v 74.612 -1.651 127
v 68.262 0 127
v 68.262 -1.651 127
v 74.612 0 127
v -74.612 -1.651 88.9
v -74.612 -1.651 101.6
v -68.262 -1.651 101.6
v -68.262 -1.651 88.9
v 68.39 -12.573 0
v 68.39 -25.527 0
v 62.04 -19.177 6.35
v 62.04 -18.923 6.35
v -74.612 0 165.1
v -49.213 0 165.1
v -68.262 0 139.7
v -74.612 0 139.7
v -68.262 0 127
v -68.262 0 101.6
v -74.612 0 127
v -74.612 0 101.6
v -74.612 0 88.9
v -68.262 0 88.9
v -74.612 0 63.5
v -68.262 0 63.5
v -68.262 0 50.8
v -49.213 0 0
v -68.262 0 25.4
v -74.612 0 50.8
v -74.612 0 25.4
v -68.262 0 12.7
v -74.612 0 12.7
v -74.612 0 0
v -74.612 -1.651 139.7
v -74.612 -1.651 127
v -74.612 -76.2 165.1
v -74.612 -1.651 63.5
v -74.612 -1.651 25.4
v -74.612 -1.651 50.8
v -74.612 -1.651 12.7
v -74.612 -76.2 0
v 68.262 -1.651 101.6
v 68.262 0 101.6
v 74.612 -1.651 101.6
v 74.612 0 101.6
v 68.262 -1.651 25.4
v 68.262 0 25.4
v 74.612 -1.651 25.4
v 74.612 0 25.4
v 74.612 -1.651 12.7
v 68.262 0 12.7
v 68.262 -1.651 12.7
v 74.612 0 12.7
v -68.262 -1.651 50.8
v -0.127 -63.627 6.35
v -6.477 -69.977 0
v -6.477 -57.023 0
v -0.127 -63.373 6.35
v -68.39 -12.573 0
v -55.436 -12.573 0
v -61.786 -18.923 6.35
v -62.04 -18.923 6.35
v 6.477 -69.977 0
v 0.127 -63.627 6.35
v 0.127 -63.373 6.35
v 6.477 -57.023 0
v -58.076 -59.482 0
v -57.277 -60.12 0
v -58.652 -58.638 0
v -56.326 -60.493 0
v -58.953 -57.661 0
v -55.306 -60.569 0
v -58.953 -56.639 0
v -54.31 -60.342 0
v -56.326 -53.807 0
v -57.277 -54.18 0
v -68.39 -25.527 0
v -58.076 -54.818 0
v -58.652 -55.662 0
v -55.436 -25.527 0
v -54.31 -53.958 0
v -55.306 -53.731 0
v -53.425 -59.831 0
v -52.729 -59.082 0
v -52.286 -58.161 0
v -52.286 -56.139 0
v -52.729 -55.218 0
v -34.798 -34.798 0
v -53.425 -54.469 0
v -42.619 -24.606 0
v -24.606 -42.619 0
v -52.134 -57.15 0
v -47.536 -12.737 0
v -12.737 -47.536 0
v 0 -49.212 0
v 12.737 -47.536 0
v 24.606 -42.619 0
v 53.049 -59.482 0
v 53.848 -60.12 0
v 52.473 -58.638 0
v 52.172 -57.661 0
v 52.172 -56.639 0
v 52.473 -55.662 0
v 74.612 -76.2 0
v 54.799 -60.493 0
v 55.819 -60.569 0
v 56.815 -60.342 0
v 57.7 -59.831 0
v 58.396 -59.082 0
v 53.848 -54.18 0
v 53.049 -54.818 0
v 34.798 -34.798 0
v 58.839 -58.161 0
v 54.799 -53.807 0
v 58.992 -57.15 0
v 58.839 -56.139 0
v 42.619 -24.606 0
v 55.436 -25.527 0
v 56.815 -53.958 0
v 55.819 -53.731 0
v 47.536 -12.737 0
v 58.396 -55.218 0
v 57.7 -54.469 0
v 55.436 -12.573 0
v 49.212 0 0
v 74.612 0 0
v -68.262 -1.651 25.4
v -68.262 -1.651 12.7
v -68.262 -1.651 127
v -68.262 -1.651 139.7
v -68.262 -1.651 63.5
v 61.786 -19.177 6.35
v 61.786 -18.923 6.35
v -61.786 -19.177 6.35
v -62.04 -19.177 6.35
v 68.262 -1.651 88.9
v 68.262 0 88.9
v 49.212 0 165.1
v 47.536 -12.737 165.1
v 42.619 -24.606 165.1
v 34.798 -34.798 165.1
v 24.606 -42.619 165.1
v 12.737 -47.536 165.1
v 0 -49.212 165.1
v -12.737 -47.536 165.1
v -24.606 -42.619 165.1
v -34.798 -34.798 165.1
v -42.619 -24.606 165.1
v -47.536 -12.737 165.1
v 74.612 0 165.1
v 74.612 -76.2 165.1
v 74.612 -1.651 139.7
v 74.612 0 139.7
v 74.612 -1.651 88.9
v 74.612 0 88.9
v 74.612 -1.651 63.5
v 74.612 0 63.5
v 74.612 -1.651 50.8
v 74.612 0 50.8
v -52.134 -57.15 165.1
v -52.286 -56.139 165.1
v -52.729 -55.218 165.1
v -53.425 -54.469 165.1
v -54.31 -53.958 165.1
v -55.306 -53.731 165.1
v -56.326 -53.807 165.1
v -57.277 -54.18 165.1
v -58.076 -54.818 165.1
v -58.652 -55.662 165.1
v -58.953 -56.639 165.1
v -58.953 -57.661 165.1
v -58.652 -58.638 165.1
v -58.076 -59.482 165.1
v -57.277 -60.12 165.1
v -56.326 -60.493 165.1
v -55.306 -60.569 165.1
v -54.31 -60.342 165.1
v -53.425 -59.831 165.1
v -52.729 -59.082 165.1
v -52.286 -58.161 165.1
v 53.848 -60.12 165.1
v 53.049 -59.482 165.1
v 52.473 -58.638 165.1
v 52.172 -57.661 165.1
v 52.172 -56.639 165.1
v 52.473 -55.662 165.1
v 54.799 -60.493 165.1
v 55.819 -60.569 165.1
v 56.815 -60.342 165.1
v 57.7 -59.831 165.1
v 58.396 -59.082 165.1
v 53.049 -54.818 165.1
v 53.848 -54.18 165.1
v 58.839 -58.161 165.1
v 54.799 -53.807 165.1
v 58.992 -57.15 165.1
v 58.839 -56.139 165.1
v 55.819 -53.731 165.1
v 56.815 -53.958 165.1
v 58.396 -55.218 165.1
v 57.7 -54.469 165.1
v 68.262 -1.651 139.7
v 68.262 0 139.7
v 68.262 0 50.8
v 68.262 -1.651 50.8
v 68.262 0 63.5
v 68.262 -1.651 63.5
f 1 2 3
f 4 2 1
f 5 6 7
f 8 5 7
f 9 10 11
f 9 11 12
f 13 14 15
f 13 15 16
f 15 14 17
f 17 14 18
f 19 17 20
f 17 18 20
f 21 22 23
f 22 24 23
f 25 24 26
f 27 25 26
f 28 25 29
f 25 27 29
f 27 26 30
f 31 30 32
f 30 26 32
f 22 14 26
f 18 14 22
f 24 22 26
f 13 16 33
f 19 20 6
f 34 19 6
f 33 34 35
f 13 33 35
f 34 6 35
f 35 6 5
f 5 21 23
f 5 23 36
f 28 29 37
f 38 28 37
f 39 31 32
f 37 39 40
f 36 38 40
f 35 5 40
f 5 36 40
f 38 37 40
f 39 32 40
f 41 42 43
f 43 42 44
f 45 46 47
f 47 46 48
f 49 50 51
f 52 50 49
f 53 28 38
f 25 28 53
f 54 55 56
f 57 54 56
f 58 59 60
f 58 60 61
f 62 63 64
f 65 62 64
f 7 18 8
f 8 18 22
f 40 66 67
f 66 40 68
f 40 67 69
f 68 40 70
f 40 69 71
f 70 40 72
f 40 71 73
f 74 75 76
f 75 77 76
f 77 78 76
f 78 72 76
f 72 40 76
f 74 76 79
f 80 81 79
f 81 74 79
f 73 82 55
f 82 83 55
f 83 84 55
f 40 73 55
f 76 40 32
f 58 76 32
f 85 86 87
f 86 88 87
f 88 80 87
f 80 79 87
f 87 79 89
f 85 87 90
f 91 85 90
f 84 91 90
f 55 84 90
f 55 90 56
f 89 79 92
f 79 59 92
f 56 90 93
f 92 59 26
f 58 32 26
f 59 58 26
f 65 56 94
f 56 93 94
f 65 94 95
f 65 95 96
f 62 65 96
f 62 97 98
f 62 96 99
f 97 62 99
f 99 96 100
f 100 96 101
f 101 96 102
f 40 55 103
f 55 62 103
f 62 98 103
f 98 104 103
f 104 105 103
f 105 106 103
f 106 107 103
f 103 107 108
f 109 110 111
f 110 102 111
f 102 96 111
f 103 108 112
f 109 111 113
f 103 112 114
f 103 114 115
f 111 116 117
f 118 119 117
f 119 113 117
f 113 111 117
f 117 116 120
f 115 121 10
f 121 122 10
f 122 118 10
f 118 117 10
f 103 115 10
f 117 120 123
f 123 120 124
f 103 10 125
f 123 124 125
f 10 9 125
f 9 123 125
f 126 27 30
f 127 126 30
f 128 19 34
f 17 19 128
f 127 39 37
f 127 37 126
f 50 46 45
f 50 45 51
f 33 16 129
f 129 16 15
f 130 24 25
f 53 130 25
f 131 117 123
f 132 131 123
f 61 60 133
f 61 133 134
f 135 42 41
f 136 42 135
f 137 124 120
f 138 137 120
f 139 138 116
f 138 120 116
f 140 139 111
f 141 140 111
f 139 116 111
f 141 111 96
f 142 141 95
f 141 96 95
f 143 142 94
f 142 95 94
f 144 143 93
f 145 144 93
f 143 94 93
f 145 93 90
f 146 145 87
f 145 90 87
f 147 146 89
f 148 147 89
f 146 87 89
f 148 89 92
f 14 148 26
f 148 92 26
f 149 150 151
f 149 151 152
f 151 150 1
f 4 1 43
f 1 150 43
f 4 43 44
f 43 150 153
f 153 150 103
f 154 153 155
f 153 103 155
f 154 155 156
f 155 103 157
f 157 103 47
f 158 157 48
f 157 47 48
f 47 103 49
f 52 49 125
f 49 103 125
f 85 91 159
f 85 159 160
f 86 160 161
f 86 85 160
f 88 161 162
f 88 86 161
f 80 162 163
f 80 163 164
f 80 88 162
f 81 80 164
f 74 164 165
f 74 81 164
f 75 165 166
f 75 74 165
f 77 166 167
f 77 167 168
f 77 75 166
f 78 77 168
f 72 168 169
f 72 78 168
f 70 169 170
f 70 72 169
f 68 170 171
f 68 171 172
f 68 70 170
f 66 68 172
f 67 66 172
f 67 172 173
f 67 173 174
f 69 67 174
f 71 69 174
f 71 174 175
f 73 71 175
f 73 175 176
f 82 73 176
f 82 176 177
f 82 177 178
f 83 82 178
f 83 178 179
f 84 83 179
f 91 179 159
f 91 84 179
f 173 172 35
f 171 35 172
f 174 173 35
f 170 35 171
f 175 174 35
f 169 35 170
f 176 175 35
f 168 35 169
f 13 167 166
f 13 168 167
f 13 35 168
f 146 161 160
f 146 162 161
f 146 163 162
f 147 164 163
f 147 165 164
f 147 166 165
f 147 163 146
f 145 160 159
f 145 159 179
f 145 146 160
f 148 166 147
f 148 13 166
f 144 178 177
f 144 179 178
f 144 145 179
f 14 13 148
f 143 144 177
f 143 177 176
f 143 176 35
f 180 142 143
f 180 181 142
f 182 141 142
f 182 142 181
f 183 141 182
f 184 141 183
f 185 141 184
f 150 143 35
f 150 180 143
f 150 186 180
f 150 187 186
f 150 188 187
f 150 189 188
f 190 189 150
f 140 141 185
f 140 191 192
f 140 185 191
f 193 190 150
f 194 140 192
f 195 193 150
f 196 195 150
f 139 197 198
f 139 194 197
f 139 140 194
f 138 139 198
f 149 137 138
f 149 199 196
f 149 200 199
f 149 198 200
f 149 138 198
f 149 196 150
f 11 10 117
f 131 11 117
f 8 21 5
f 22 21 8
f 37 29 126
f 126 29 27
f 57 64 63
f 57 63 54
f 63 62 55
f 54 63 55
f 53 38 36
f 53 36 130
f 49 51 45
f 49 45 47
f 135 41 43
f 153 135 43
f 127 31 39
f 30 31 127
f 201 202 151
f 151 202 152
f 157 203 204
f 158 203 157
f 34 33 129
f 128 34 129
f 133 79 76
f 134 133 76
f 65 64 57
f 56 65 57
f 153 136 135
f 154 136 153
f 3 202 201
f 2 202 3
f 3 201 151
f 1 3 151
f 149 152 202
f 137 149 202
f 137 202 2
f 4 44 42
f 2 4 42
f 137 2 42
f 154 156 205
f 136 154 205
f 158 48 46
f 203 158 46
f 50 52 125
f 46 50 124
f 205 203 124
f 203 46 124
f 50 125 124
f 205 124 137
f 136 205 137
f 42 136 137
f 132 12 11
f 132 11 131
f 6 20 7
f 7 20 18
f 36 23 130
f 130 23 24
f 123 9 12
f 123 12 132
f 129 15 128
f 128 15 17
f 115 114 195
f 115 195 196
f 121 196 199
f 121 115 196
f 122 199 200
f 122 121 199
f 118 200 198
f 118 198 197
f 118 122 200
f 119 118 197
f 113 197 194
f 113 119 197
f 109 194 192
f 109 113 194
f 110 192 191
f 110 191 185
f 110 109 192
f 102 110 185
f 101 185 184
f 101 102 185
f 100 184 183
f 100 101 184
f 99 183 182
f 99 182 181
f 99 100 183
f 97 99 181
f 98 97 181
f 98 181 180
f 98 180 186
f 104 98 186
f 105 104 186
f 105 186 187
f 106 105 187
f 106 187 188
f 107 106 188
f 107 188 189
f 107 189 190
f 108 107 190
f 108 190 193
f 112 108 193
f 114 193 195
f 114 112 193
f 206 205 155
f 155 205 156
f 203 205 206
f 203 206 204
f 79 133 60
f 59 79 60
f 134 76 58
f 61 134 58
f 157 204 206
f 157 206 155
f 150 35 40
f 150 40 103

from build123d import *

# Parameters (mm, degrees)
SKETCH1_R                    = 3.429
BOSS_EXTRUDE1_DEPTH          = 165.1
SKETCH2_W                    = 12.954
SKETCH2_H                    = 12.954
CUT_EXTRUDE1_DEPTH           = 6.35
CUT_EXTRUDE1_DRAFT           = -45
CUT_EXTRUDE1_PROFILE_2_DEPTH = 6.35
CUT_EXTRUDE1_PROFILE_2_DRAFT = -45
CUT_EXTRUDE1_PROFILE_3_DEPTH = 6.35
CUT_EXTRUDE1_PROFILE_3_DRAFT = -45
SKETCH3_W                    = 6.35
SKETCH3_H                    = 12.7
CUT_EXTRUDE2_DEPTH           = 1.651


with BuildPart() as part:
    # Sketch1 → Boss-Extrude1 (new body)
    with BuildSketch(Plane.XY):
        with BuildLine():
            Line((-49.2125, 0), (-74.6125, 0))
            Line((-74.6125, 0), (-74.6125, -76.2))
            Line((-74.6125, -76.2), (74.6125, -76.2))
            Line((74.6125, -76.2), (74.6125, 0))
            Line((74.6125, 0), (49.2125, 0))
            ThreePointArc((49.2125, 0), (0, -49.2125), (-49.2125, 0))
        make_face()
        with Locations((-55.5625, -57.15)):
            Circle(SKETCH1_R, mode=Mode.SUBTRACT)
        with Locations((55.5625, -57.15)):
            Circle(SKETCH1_R, mode=Mode.SUBTRACT)
    extrude(amount=BOSS_EXTRUDE1_DEPTH)


with BuildPart() as cut_extrude1_tool:
    # Sketch2 → Cut-Extrude1 (with draft: the straight prism first)
    with BuildSketch(Plane(origin=(0, 0, 0), x_dir=(-1, 0, 0), z_dir=(0, 0, -1))):
        with Locations((-61.9125, -19.05)):
            Rectangle(SKETCH2_W, SKETCH2_H)
    extrude(amount=-CUT_EXTRUDE1_DEPTH)
    # Cut-Extrude1: the draft: its side faces are tilted about the plane it starts from
    cut_extrude1_sides = [cut_extrude1_tool.faces().sort_by_distance(p)[0] for p in [
        (68.3895, -19.05, 3.175),
        (61.9125, -25.527, 3.175),
        (55.4355, -19.05, 3.175),
        (61.9125, -12.573, 3.175),
    ]]
    draft(cut_extrude1_sides, Plane(origin=(0, 0, 0), x_dir=(-1, 0, 0), z_dir=(0, 0, -1)), CUT_EXTRUDE1_DRAFT)


with BuildPart() as part_1:
    add(part.part)

    # Cut-Extrude1: cut by cut_extrude1_tool
    add(cut_extrude1_tool.part, mode=Mode.SUBTRACT)


with BuildPart() as cut_extrude1_profile_2_tool:
    # Sketch2 → Cut-Extrude1 profile 2 (with draft: the straight prism first)
    with BuildSketch(Plane(origin=(0, 0, 0), x_dir=(-1, 0, 0), z_dir=(0, 0, -1))):
        with Locations((0, -63.5)):
            Rectangle(SKETCH2_W, SKETCH2_H)
    extrude(amount=-CUT_EXTRUDE1_PROFILE_2_DEPTH)
    # Cut-Extrude1 profile 2: the draft: its side faces are tilted about the plane it starts from
    cut_extrude1_profile_2_sides = [cut_extrude1_profile_2_tool.faces().sort_by_distance(p)[0] for p in [
        (6.477, -63.5, 3.175),
        (0, -69.977, 3.175),
        (-6.477, -63.5, 3.175),
        (0, -57.023, 3.175),
    ]]
    draft(cut_extrude1_profile_2_sides, Plane(origin=(0, 0, 0), x_dir=(-1, 0, 0), z_dir=(0, 0, -1)), CUT_EXTRUDE1_PROFILE_2_DRAFT)


with BuildPart() as part_2:
    add(part_1.part)

    # Cut-Extrude1 profile 2: cut by cut_extrude1_profile_2_tool
    add(cut_extrude1_profile_2_tool.part, mode=Mode.SUBTRACT)


with BuildPart() as cut_extrude1_profile_3_tool:
    # Sketch2 → Cut-Extrude1 profile 3 (with draft: the straight prism first)
    with BuildSketch(Plane(origin=(0, 0, 0), x_dir=(-1, 0, 0), z_dir=(0, 0, -1))):
        with Locations((61.9125, -19.05)):
            Rectangle(SKETCH2_W, SKETCH2_H)
    extrude(amount=-CUT_EXTRUDE1_PROFILE_3_DEPTH)
    # Cut-Extrude1 profile 3: the draft: its side faces are tilted about the plane it starts from
    cut_extrude1_profile_3_sides = [cut_extrude1_profile_3_tool.faces().sort_by_distance(p)[0] for p in [
        (-55.4355, -19.05, 3.175),
        (-61.9125, -25.527, 3.175),
        (-68.3895, -19.05, 3.175),
        (-61.9125, -12.573, 3.175),
    ]]
    draft(cut_extrude1_profile_3_sides, Plane(origin=(0, 0, 0), x_dir=(-1, 0, 0), z_dir=(0, 0, -1)), CUT_EXTRUDE1_PROFILE_3_DRAFT)


with BuildPart() as part_3:
    add(part_2.part)

    # Cut-Extrude1 profile 3: cut by cut_extrude1_profile_3_tool
    add(cut_extrude1_profile_3_tool.part, mode=Mode.SUBTRACT)

    # Sketch3 → Cut-Extrude2 (cut)
    with BuildSketch(Plane(origin=(0, 0, 0), x_dir=(1, 0, 0), z_dir=(0, 1, 0))):
        with Locations((71.4375, -19.05)):
            Rectangle(SKETCH3_W, SKETCH3_H)
        with Locations((71.4375, -57.15)):
            Rectangle(SKETCH3_W, SKETCH3_H)
        with Locations((71.4375, -95.25)):
            Rectangle(SKETCH3_W, SKETCH3_H)
        with Locations((71.4375, -133.35)):
            Rectangle(SKETCH3_W, SKETCH3_H)
        with Locations((-71.4375, -57.15)):
            Rectangle(SKETCH3_W, SKETCH3_H)
        with Locations((-71.4375, -95.25)):
            Rectangle(SKETCH3_W, SKETCH3_H)
        with Locations((-71.4375, -133.35)):
            Rectangle(SKETCH3_W, SKETCH3_H)
        with Locations((-71.4375, -19.05)):
            Rectangle(SKETCH3_W, SKETCH3_H)
    extrude(amount=-CUT_EXTRUDE2_DEPTH, mode=Mode.SUBTRACT)


solid = part_3.part
